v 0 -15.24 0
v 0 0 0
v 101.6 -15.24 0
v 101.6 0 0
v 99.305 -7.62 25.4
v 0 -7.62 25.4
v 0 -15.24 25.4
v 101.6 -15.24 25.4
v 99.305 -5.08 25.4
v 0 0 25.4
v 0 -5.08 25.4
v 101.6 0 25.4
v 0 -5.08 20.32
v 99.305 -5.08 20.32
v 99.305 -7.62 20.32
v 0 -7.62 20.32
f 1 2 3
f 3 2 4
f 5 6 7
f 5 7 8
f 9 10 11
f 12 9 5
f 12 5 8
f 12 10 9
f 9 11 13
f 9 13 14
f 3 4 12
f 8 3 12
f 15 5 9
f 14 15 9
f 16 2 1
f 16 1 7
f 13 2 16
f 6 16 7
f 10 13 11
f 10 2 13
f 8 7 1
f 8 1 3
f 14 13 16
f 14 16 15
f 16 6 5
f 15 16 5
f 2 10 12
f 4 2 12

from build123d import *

# Parameters (mm, degrees)
F0_W     = 101.6
F0_H     = 25.4
F1_DEPTH = 15.24
F2_W     = 99.3054434657
F2_H     = 2.54
F3_DEPTH = 5.08


# Not quite as in the source:
# - the program builds the solid bodies; features that only make, move or delete a surface that nothing else refers to are left out


with BuildPart() as f1:
    # F0 (on Front) → F1 (new body)
    with BuildSketch(Plane.XZ):
        with Locations((50.8, 12.7)):
            Rectangle(F0_W, F0_H)
    extrude(amount=F1_DEPTH)

    # F2 (on face) → F3 (cut)
    with BuildSketch(Plane.XY.offset(25.4)):
        with Locations((49.6527217329, -6.35)):
            Rectangle(F2_W, F2_H)
    extrude(amount=-F3_DEPTH, mode=Mode.SUBTRACT)


solid = f1.part
